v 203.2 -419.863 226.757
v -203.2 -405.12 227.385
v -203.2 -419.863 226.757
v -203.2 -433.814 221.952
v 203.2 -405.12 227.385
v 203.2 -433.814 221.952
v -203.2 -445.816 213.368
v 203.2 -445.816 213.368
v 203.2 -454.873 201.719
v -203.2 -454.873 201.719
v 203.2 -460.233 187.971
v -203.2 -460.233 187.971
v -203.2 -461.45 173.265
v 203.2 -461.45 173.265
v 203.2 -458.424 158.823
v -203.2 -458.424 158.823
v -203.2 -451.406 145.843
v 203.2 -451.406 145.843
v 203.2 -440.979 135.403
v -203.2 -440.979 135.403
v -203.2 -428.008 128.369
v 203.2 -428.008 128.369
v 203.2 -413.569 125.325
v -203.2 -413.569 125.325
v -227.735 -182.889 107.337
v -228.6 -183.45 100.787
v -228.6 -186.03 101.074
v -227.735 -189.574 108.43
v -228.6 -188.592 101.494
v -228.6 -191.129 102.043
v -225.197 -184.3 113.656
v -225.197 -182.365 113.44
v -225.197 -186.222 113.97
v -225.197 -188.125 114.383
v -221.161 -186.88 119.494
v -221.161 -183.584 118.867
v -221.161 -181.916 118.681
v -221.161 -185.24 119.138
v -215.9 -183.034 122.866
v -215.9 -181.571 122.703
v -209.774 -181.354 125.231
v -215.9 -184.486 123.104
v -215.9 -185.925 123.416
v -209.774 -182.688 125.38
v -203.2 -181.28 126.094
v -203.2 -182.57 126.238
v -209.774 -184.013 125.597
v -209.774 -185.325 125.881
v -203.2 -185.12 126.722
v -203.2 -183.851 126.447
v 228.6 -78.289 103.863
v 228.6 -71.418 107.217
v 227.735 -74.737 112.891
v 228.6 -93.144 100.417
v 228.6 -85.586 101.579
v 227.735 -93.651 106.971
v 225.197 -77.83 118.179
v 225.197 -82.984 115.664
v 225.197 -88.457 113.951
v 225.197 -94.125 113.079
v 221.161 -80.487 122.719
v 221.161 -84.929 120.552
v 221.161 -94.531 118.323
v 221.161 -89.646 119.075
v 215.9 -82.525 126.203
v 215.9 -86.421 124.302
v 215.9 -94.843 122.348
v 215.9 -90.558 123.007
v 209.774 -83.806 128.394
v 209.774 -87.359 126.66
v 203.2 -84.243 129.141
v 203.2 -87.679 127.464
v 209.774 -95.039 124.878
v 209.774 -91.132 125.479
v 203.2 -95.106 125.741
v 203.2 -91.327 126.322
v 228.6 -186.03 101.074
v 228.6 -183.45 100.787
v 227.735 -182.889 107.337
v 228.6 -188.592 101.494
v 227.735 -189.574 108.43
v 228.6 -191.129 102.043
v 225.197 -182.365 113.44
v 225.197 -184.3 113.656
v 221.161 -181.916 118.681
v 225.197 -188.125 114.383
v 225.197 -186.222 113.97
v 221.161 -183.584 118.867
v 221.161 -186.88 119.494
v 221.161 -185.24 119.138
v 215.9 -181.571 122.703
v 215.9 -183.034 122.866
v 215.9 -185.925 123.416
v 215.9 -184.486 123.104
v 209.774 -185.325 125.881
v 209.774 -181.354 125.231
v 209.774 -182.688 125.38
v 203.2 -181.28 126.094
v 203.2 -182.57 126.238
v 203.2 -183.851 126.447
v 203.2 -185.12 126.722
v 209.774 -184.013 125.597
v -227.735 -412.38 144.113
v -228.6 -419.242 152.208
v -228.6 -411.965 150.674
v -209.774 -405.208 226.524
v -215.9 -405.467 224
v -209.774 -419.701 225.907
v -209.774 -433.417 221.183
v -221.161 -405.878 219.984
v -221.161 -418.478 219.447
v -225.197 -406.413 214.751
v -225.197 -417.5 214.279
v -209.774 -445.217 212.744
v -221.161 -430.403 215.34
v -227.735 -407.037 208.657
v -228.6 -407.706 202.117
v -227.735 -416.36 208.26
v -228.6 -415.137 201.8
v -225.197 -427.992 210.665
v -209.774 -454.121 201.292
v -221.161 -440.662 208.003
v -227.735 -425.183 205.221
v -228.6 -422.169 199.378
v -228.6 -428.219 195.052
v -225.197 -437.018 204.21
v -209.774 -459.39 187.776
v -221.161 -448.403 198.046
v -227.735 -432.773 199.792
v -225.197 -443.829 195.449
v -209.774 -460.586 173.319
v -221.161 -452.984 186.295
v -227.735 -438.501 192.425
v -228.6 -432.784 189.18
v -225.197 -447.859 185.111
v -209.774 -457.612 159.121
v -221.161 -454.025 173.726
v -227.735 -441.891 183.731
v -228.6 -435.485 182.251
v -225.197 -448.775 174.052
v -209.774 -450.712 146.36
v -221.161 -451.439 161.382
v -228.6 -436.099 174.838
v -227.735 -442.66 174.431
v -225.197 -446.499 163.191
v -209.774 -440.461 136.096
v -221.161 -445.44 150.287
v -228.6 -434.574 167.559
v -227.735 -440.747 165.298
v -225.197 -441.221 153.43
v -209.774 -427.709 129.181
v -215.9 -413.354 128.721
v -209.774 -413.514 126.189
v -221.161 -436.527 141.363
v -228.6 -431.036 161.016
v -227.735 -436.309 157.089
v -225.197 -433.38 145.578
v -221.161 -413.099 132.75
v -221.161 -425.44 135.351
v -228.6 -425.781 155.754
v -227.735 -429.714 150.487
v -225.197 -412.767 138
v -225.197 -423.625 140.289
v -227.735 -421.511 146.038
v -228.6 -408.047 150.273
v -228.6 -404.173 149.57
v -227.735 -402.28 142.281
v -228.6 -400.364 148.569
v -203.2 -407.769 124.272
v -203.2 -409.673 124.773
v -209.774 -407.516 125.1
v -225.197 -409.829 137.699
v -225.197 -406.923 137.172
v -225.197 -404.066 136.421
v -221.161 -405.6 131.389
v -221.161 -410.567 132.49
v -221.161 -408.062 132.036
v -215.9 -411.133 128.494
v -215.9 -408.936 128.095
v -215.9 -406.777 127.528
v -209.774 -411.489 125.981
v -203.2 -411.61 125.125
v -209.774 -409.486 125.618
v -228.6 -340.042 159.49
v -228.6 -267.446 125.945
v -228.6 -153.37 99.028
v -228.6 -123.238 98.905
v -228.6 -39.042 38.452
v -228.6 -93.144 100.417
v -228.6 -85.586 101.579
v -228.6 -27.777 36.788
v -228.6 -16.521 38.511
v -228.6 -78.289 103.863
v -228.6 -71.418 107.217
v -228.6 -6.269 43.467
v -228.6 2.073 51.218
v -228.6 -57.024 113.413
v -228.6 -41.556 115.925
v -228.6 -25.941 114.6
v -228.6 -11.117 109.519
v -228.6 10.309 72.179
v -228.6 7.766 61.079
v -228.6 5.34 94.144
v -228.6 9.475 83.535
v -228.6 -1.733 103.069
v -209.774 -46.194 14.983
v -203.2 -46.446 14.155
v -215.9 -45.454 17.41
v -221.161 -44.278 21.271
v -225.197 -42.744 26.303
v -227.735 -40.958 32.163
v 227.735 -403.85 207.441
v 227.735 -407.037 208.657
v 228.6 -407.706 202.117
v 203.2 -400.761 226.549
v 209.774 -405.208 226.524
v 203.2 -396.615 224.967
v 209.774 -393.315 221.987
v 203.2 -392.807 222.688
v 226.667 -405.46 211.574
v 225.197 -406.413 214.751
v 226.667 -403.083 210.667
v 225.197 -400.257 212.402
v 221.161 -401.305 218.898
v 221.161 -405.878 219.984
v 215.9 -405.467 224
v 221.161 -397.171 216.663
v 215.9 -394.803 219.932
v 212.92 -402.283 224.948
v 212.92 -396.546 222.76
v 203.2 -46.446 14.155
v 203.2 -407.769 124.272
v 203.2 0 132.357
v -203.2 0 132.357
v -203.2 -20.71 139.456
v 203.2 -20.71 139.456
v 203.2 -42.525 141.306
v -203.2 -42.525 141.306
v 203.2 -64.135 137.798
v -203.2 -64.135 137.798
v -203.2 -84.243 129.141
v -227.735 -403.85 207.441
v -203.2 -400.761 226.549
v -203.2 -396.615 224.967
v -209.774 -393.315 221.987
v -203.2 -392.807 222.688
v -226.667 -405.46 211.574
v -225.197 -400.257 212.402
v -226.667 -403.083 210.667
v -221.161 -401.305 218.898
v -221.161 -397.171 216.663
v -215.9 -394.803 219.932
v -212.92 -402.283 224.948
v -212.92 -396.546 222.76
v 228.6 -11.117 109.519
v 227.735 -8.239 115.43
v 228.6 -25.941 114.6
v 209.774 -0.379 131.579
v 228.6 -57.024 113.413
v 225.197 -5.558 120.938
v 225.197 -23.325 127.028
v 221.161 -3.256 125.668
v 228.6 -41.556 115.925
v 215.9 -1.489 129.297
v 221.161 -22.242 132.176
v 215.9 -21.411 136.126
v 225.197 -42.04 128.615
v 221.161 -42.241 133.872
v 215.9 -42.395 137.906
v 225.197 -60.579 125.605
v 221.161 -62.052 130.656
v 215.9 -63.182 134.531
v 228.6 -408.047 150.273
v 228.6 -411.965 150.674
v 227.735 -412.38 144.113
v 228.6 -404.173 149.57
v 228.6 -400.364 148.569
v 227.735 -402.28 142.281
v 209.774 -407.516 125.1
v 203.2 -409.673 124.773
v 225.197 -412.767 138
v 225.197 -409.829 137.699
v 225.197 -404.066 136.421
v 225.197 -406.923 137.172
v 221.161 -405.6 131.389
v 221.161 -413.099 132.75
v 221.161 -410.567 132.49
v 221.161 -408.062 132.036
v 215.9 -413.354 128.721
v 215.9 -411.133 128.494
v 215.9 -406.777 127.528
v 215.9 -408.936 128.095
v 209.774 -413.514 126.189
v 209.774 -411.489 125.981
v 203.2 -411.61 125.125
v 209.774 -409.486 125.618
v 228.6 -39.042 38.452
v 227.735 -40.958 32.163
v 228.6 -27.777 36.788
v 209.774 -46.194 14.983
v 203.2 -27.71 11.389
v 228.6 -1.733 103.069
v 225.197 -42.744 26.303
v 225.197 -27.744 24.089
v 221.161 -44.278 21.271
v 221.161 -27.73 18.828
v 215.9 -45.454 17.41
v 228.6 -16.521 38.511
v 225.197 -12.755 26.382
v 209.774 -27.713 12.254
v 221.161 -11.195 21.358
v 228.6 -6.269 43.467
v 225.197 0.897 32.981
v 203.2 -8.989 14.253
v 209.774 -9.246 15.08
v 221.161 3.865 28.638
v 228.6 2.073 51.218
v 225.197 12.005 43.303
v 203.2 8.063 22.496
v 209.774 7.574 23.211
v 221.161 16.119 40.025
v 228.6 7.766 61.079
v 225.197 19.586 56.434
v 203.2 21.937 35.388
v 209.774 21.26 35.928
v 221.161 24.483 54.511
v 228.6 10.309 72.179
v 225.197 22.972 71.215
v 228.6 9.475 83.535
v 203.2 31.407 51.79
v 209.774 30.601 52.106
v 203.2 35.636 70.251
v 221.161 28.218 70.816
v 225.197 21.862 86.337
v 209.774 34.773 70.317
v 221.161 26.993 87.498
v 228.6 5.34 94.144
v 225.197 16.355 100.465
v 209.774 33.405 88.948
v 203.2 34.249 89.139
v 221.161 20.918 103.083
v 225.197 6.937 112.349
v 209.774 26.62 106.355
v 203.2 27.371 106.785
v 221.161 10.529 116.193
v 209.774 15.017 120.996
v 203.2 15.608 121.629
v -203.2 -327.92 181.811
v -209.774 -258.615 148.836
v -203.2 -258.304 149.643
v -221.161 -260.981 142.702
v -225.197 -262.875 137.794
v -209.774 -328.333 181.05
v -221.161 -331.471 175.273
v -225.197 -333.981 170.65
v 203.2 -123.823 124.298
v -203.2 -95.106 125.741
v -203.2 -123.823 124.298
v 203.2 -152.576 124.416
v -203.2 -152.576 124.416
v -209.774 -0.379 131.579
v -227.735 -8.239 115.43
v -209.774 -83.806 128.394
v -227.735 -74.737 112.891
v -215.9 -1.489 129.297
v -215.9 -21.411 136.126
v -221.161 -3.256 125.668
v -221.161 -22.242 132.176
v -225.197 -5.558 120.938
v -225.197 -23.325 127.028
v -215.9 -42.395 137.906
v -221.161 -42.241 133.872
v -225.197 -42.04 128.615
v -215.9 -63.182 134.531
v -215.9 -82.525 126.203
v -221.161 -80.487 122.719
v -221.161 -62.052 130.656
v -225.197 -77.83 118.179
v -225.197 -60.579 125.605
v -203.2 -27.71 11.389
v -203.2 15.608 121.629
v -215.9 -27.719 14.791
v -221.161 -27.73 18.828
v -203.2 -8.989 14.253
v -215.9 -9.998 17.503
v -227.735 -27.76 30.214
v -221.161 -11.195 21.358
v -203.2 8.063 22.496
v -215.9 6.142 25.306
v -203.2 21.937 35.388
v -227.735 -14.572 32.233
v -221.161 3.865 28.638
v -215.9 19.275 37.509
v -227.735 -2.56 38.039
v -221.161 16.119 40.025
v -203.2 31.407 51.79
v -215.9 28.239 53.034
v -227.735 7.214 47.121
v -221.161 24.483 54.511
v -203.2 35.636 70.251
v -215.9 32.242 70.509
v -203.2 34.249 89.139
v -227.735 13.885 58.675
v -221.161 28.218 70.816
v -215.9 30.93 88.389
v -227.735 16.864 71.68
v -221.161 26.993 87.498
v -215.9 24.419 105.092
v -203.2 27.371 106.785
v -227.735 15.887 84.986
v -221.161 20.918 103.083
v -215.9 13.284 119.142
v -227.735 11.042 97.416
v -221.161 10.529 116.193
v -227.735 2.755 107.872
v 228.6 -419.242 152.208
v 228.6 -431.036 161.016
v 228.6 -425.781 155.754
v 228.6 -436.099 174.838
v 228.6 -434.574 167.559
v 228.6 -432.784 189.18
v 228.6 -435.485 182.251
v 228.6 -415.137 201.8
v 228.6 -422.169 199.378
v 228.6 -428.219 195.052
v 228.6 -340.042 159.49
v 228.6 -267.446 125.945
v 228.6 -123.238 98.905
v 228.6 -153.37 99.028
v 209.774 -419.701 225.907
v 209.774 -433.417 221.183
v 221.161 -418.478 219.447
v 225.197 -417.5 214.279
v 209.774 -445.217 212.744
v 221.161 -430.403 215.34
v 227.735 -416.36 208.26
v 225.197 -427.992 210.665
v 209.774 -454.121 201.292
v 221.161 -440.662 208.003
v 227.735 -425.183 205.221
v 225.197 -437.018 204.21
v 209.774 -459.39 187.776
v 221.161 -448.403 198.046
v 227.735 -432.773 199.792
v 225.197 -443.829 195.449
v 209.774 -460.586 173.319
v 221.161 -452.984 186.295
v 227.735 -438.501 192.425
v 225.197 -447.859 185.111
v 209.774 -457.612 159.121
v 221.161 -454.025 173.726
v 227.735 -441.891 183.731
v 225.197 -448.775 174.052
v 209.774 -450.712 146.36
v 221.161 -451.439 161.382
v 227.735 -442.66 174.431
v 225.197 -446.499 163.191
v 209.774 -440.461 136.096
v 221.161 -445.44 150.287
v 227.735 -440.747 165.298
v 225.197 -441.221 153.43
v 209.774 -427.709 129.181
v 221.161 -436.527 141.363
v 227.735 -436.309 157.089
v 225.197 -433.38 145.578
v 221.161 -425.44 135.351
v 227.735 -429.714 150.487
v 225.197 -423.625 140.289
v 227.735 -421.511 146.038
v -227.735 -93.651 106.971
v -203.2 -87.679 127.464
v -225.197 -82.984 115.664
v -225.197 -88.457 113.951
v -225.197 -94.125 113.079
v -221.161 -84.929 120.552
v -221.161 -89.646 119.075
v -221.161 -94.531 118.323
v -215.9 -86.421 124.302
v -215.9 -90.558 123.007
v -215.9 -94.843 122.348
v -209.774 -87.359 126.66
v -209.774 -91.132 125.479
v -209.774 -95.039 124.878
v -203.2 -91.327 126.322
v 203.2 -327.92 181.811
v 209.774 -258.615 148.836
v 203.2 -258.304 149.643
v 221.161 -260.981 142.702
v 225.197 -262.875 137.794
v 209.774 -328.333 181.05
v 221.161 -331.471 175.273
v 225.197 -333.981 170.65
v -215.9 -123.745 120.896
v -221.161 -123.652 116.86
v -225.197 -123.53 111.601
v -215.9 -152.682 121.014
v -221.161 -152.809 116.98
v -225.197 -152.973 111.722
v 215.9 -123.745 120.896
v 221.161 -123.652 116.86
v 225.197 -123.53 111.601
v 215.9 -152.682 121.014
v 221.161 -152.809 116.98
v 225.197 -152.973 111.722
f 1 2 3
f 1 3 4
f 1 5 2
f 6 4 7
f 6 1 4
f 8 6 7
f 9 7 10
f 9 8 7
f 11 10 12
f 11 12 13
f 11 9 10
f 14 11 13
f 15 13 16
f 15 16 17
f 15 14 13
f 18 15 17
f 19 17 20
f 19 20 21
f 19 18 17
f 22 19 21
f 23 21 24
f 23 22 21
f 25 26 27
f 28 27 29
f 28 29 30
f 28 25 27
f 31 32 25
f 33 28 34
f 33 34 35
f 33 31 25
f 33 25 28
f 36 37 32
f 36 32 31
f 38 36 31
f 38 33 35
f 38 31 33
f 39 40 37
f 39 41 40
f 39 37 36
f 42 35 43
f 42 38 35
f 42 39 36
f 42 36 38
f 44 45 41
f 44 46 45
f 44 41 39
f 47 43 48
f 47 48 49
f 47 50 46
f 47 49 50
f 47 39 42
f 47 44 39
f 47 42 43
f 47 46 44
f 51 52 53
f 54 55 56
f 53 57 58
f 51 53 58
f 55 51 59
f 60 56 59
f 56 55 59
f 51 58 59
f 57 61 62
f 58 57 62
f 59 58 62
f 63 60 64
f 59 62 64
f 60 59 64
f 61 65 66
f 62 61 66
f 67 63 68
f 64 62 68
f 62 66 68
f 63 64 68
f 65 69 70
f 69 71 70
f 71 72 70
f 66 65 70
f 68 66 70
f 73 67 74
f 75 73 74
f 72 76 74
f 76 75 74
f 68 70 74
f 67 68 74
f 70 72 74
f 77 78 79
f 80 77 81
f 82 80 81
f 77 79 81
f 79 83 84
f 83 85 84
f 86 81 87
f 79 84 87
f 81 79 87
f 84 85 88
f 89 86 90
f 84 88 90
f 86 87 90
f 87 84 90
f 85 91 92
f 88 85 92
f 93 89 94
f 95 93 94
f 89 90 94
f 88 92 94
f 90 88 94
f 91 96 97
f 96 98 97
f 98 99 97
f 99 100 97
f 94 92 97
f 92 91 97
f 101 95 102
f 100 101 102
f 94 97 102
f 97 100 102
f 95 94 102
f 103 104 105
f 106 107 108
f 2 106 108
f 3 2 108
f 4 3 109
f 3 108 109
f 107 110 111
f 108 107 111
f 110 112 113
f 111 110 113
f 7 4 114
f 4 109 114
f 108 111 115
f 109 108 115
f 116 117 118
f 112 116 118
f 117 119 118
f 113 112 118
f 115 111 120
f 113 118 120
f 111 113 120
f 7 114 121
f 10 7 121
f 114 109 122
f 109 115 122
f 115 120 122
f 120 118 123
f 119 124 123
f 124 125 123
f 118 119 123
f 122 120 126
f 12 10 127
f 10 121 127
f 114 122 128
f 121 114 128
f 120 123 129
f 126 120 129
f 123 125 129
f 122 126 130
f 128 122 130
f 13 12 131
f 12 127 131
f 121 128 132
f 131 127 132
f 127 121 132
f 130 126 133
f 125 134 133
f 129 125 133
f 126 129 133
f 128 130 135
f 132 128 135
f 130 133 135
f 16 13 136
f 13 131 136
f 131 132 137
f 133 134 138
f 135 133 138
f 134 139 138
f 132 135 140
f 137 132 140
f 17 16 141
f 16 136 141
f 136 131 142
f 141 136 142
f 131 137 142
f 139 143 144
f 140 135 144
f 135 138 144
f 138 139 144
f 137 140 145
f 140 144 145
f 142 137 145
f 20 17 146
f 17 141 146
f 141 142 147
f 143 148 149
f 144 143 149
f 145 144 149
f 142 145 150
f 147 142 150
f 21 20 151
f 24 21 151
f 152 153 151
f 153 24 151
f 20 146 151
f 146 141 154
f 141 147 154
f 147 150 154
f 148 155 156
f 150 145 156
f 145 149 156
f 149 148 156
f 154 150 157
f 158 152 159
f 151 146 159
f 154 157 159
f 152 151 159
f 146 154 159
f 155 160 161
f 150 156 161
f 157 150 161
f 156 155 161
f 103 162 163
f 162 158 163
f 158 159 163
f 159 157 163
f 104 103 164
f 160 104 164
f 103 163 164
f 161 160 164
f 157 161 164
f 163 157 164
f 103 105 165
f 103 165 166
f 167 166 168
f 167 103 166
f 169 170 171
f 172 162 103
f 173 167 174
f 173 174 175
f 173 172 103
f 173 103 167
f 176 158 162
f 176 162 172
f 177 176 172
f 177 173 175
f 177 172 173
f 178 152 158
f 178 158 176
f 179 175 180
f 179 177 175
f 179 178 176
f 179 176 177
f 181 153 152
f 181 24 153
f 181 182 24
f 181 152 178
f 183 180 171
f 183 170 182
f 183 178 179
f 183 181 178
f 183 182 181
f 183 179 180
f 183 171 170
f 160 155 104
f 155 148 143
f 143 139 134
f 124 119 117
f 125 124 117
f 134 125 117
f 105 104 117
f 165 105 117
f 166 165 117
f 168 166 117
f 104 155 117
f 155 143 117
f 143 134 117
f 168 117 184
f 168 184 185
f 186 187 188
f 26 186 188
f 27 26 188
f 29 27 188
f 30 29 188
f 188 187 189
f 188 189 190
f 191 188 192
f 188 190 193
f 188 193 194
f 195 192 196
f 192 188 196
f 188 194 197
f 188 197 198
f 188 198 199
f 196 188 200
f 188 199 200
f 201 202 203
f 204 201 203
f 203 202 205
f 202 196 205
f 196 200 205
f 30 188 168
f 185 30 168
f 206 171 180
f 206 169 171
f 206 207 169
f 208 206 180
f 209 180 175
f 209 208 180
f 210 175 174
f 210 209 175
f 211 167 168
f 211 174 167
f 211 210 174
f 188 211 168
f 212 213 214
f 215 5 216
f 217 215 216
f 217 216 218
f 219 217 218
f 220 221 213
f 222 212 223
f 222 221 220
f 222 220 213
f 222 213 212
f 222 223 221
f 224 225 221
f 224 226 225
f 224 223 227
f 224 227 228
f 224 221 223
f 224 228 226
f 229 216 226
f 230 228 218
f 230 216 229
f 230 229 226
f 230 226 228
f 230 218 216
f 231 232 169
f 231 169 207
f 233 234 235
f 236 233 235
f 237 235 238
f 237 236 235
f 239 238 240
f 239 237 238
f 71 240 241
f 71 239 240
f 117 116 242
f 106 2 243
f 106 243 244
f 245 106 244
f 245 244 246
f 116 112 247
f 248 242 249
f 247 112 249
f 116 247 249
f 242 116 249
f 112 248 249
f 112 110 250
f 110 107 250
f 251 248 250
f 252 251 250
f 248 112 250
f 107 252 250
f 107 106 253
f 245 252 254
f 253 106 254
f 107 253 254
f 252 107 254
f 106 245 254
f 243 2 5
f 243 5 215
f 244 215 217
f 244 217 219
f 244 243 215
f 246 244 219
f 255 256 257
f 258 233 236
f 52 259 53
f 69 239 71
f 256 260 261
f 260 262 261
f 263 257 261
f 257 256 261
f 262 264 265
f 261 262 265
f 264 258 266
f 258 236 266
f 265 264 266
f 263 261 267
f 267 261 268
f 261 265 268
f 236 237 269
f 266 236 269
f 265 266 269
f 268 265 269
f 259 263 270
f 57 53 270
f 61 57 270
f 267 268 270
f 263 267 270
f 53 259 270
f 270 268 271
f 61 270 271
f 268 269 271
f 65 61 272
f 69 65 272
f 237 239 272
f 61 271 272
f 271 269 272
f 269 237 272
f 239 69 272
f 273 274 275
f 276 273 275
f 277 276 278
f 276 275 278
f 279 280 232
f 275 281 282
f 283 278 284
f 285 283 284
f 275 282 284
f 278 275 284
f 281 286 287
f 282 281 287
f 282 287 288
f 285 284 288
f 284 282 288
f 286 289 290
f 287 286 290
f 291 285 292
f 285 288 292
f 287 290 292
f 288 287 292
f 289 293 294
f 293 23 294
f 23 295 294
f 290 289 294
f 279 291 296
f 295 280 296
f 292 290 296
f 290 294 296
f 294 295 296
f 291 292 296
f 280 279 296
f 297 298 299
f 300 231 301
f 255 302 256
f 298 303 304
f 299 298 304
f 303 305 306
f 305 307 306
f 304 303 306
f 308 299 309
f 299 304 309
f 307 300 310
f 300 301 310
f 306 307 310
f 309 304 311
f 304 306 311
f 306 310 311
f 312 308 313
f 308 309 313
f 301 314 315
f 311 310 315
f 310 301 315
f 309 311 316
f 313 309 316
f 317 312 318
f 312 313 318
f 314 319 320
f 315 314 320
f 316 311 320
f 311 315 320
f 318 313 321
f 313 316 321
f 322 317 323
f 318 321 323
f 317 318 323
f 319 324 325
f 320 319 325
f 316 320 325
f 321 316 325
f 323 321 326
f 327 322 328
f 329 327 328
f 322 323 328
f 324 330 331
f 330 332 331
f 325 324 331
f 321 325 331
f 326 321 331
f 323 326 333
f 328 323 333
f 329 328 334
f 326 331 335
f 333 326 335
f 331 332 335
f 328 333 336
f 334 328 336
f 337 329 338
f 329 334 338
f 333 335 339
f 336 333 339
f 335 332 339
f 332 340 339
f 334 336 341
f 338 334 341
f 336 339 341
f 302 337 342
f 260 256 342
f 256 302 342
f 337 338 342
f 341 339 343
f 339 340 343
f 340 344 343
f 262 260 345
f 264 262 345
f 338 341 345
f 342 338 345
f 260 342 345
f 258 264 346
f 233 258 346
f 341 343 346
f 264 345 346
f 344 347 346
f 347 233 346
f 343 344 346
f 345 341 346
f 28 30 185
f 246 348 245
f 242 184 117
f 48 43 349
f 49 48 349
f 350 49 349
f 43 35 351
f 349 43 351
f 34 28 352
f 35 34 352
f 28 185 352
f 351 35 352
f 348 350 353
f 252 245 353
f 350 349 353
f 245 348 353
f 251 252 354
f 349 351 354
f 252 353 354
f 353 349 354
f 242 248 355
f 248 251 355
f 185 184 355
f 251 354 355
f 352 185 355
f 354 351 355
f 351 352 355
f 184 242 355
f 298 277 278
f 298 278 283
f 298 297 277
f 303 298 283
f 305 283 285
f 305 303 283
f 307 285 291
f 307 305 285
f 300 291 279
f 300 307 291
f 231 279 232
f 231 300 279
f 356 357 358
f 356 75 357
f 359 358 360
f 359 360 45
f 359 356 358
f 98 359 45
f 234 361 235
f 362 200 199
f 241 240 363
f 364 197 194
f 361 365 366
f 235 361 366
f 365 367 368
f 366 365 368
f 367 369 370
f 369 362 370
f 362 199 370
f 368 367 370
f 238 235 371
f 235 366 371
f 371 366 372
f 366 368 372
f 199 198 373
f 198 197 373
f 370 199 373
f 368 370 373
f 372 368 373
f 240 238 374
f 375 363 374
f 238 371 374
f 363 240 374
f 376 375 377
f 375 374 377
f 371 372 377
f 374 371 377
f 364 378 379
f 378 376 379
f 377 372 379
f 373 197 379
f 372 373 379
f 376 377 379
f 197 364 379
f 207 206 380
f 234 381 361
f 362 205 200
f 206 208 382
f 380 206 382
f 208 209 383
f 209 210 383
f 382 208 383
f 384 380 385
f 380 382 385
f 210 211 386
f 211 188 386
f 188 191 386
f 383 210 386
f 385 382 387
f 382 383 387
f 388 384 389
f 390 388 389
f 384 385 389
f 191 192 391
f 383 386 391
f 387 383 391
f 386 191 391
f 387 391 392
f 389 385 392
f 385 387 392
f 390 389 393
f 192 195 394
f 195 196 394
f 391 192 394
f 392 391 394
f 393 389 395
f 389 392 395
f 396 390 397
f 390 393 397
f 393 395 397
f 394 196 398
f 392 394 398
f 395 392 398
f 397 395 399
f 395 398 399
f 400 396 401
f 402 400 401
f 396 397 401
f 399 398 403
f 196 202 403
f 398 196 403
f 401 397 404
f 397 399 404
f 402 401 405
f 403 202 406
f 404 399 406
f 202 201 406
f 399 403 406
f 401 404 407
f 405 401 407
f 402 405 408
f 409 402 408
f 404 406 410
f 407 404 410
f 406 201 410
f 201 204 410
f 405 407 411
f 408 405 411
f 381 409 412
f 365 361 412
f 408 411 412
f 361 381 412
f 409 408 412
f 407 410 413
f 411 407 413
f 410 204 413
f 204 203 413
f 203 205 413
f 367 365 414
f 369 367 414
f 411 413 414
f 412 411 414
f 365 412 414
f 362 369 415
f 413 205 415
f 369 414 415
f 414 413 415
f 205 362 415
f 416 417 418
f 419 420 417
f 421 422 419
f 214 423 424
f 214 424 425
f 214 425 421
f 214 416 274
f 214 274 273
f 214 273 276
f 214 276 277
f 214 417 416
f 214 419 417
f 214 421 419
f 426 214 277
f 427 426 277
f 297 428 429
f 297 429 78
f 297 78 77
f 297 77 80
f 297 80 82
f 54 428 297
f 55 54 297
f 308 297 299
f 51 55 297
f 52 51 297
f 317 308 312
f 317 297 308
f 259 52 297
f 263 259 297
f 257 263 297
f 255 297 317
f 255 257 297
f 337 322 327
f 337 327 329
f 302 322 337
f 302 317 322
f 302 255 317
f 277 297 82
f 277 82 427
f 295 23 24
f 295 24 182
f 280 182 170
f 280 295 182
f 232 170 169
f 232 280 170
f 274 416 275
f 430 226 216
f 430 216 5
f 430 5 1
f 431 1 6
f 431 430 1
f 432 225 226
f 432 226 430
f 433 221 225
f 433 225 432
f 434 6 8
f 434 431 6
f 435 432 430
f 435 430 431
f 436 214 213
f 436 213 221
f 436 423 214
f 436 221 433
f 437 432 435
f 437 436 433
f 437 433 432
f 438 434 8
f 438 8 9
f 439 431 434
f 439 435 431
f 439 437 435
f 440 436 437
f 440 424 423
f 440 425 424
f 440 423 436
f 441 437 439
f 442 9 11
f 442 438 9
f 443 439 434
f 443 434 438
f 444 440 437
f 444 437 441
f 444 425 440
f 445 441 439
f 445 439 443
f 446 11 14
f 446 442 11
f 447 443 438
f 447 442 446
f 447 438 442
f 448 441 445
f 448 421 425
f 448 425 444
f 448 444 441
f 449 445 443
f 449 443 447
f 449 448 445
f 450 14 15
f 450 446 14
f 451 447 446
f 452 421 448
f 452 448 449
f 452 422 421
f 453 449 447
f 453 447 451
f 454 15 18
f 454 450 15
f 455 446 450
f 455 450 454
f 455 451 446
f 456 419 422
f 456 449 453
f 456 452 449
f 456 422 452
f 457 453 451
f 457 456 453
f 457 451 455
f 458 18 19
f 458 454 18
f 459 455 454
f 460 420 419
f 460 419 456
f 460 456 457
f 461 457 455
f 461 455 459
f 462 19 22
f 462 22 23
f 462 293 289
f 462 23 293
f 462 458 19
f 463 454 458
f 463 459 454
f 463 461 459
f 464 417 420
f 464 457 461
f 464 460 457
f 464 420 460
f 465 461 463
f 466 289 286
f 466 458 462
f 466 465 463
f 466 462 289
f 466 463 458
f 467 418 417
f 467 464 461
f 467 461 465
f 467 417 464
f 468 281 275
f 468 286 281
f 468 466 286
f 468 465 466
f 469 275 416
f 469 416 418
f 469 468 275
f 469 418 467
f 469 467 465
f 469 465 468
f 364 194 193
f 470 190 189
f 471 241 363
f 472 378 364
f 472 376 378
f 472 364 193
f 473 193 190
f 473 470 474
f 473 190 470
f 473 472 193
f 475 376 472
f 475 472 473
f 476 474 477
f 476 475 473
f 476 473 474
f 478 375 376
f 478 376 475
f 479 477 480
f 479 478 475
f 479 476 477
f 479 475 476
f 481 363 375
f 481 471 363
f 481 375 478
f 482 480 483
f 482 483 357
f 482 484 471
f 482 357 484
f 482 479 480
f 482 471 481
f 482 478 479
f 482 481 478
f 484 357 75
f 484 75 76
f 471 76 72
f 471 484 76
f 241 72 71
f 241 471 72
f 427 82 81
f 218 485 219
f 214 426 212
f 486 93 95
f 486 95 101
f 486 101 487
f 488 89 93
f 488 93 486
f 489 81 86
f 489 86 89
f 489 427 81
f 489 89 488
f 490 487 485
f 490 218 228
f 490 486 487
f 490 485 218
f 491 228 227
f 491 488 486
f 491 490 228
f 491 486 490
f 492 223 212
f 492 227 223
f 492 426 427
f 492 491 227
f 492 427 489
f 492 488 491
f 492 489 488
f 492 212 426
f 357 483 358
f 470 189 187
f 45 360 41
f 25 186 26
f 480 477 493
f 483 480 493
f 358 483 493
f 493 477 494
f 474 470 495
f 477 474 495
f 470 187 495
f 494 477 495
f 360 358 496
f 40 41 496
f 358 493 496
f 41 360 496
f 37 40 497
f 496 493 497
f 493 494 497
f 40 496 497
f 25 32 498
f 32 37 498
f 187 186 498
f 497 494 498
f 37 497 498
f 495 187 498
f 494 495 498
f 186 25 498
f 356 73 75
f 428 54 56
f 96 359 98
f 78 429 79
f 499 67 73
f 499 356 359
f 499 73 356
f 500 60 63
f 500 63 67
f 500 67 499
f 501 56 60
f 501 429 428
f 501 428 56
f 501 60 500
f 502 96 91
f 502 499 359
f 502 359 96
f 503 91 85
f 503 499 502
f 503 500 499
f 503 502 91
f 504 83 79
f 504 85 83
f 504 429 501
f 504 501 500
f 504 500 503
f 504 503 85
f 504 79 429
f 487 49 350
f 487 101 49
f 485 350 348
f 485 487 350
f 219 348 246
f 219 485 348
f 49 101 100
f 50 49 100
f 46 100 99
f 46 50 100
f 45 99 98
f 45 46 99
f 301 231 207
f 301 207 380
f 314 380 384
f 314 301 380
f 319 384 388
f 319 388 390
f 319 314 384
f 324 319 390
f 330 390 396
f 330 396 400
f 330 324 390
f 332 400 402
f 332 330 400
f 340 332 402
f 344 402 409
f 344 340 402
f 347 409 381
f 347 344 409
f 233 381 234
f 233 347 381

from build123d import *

# Parameters (mm, degrees)
F1_DEPTH = 228.6
F2_R     = 25.4


with BuildPart() as f1:
    # F0 (on Right) → F1 (new body, symmetric)
    with BuildSketch(Plane.YZ):
        with BuildLine():
            ThreePointArc((-397.279083, 225.959099), (-461.086876, 183.29803), (-410.897082, 125.225783))
            Line((-410.897082, 125.225783), (-46.446397, 14.155093))
            ThreePointArc((-46.446397, 14.155093), (31.406704, 51.789828), (0, 132.357175))
            ThreePointArc((0, 132.357175), (-45.230298, 141.1617), (-88.834917, 126.264159))
            ThreePointArc((-88.834917, 126.264159), (-136.030627, 124.157236), (-183.226337, 126.264159))
            ThreePointArc((-183.226337, 126.264159), (-295.26164, 165.357068), (-397.279083, 225.959099))
        make_face()
    extrude(amount=F1_DEPTH, both=True)

    # F2
    f2_edges = [f1.edges().sort_by_distance(p)[0] for p in [
        (-228.6, -461.086876, 183.29803),
        (-228.6, -228.671739, 69.690438),
        (-228.6, 31.406704, 51.789828),
        (-228.6, -45.230298, 141.1617),
        (-228.6, -136.030627, 124.157236),
        (-228.6, -295.26164, 165.357068),
        (228.6, -461.086876, 183.29803),
        (228.6, -228.671739, 69.690438),
        (228.6, 31.406704, 51.789828),
        (228.6, -45.230298, 141.1617),
        (228.6, -136.030627, 124.157236),
        (228.6, -295.26164, 165.357068),
        (0, -183.226337, 126.264159),
        (0, -88.834917, 126.264159),
        (0, 0, 132.357175),
        (0, -397.279083, 225.959099),
        (0, -410.897082, 125.225783),
        (0, -46.446397, 14.155093),
    ]]
    fillet(f2_edges, radius=F2_R)


solid = f1.part
